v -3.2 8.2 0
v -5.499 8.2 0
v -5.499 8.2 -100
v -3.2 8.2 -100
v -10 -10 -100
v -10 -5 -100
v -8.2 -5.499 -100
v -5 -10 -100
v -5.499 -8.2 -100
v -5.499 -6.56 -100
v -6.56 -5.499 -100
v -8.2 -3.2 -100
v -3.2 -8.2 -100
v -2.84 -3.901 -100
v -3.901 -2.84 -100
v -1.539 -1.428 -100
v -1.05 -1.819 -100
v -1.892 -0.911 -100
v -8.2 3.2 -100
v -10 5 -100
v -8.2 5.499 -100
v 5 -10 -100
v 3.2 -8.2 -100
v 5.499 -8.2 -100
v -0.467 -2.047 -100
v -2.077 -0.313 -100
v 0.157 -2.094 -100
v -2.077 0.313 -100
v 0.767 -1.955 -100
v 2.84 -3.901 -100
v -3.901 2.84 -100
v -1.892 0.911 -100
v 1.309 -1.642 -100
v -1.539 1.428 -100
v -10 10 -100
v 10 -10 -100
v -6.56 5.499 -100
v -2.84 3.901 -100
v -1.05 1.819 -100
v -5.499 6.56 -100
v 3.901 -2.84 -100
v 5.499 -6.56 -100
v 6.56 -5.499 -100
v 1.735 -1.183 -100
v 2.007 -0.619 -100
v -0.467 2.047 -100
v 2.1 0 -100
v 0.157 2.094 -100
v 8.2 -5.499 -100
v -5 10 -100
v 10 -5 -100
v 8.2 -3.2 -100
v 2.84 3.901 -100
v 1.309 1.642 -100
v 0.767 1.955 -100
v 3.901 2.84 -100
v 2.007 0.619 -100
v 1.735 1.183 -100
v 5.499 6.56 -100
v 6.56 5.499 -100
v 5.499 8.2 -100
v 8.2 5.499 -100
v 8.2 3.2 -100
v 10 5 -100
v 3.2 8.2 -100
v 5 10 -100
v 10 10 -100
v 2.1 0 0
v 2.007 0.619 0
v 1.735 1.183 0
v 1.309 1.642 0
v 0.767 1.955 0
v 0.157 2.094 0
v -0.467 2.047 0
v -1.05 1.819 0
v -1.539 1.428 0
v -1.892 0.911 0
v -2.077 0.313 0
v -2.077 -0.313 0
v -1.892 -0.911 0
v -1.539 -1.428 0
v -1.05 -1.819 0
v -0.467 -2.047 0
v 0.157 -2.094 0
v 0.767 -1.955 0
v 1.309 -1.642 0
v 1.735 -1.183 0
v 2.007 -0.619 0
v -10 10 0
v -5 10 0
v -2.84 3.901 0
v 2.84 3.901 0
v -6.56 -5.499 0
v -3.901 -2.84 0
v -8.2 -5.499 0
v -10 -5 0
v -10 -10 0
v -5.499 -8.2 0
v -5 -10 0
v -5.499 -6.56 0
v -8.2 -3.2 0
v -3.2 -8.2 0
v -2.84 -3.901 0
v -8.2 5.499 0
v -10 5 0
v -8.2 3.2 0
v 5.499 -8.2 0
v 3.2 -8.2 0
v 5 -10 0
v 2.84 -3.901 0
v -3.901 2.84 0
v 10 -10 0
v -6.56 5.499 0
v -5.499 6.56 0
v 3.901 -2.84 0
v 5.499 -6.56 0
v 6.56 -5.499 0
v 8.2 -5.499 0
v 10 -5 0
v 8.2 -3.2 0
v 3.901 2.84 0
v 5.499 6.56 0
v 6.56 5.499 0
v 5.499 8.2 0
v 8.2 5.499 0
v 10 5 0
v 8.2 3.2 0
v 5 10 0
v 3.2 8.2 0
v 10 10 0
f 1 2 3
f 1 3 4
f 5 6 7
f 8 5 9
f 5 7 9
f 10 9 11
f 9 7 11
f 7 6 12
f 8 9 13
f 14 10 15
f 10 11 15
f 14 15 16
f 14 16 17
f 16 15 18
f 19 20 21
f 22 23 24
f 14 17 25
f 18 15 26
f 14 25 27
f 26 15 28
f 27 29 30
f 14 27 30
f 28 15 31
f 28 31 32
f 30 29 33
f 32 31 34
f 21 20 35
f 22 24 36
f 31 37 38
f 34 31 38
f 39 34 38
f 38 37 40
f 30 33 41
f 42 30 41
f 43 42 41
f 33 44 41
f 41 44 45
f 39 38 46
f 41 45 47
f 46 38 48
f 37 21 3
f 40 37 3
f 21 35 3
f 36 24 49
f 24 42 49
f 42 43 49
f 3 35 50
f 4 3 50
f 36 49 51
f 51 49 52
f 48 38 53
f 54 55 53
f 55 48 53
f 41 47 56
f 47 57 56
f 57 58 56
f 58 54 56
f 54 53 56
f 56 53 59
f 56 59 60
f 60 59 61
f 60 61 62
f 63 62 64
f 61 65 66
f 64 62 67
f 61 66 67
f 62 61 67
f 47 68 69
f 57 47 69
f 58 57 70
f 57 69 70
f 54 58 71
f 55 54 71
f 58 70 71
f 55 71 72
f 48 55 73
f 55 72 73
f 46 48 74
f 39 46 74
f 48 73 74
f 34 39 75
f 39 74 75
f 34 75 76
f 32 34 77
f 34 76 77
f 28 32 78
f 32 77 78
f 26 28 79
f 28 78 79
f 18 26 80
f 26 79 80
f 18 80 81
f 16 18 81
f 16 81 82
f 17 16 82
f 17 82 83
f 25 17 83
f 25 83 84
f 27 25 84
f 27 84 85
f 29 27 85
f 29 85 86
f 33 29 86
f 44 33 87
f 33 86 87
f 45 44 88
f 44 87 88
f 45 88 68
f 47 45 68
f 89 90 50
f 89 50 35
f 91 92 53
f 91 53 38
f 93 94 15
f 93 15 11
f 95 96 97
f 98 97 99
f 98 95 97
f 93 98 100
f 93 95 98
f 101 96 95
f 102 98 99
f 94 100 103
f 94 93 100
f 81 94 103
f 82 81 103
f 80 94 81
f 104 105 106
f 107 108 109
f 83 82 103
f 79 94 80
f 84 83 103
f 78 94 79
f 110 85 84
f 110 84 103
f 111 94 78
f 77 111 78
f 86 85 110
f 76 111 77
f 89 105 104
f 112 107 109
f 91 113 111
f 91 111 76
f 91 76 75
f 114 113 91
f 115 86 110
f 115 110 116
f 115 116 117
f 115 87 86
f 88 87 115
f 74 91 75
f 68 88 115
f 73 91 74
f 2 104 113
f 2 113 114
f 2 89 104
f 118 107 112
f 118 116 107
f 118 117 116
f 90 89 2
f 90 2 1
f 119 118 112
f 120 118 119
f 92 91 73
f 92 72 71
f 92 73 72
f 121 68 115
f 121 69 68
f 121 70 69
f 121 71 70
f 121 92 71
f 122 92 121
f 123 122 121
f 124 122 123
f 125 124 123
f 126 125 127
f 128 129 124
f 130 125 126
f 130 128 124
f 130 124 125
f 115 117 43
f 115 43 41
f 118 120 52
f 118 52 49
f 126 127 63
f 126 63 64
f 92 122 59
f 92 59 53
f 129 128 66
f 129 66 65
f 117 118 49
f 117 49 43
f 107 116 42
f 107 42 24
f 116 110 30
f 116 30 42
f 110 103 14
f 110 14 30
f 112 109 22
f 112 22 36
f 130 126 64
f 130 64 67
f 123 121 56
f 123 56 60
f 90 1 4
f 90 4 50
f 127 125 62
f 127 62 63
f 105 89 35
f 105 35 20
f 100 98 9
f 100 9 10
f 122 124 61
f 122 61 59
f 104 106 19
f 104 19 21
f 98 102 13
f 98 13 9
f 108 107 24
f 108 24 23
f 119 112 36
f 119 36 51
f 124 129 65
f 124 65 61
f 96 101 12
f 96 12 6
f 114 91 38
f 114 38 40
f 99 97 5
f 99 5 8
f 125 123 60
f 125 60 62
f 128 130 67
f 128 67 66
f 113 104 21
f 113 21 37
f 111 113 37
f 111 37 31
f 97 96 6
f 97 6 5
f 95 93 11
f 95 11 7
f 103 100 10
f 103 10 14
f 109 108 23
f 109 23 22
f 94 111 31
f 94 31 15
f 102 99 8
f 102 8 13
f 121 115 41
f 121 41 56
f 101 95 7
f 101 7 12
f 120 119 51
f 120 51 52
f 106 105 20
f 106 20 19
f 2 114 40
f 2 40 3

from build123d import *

# Parameters (mm, degrees)
SKETCH1_R           = 2.1
BOSS_EXTRUDE1_DEPTH = 100


with BuildPart() as part:
    # Sketch1 → Boss-Extrude1 (new body)
    with BuildSketch(Plane.XY):
        Polygon((-10, 10), (-10, 5), (-8.2, 3.2), (-8.2, 5.499339828), (-6.56, 5.499339828), (-3.900660172, 2.84), (-3.900660172, -2.84), (-6.56, -5.499339828), (-8.2, -5.499339828), (-8.2, -3.2), (-10, -5), (-10, -10), (-5, -10), (-3.2, -8.2), (-5.499339828, -8.2), (-5.499339828, -6.56), (-2.84, -3.900660172), (2.84, -3.900660172), (5.499339828, -6.56), (5.499339828, -8.2), (3.2, -8.2), (5, -10), (10, -10), (10, -5), (8.2, -3.2), (8.2, -5.499339828), (6.56, -5.499339828), (3.900660172, -2.84), (3.900660172, 2.84), (6.56, 5.499339828), (8.2, 5.499339828), (8.2, 3.2), (10, 5), (10, 10), (5, 10), (3.2, 8.2), (5.499339828, 8.2), (5.499339828, 6.56), (2.84, 3.900660172), (-2.84, 3.900660172), (-5.499339828, 6.56), (-5.499339828, 8.2), (-3.2, 8.2), (-5, 10), align=None)
        Circle(SKETCH1_R, mode=Mode.SUBTRACT)
    extrude(amount=-BOSS_EXTRUDE1_DEPTH)


solid = part.part
